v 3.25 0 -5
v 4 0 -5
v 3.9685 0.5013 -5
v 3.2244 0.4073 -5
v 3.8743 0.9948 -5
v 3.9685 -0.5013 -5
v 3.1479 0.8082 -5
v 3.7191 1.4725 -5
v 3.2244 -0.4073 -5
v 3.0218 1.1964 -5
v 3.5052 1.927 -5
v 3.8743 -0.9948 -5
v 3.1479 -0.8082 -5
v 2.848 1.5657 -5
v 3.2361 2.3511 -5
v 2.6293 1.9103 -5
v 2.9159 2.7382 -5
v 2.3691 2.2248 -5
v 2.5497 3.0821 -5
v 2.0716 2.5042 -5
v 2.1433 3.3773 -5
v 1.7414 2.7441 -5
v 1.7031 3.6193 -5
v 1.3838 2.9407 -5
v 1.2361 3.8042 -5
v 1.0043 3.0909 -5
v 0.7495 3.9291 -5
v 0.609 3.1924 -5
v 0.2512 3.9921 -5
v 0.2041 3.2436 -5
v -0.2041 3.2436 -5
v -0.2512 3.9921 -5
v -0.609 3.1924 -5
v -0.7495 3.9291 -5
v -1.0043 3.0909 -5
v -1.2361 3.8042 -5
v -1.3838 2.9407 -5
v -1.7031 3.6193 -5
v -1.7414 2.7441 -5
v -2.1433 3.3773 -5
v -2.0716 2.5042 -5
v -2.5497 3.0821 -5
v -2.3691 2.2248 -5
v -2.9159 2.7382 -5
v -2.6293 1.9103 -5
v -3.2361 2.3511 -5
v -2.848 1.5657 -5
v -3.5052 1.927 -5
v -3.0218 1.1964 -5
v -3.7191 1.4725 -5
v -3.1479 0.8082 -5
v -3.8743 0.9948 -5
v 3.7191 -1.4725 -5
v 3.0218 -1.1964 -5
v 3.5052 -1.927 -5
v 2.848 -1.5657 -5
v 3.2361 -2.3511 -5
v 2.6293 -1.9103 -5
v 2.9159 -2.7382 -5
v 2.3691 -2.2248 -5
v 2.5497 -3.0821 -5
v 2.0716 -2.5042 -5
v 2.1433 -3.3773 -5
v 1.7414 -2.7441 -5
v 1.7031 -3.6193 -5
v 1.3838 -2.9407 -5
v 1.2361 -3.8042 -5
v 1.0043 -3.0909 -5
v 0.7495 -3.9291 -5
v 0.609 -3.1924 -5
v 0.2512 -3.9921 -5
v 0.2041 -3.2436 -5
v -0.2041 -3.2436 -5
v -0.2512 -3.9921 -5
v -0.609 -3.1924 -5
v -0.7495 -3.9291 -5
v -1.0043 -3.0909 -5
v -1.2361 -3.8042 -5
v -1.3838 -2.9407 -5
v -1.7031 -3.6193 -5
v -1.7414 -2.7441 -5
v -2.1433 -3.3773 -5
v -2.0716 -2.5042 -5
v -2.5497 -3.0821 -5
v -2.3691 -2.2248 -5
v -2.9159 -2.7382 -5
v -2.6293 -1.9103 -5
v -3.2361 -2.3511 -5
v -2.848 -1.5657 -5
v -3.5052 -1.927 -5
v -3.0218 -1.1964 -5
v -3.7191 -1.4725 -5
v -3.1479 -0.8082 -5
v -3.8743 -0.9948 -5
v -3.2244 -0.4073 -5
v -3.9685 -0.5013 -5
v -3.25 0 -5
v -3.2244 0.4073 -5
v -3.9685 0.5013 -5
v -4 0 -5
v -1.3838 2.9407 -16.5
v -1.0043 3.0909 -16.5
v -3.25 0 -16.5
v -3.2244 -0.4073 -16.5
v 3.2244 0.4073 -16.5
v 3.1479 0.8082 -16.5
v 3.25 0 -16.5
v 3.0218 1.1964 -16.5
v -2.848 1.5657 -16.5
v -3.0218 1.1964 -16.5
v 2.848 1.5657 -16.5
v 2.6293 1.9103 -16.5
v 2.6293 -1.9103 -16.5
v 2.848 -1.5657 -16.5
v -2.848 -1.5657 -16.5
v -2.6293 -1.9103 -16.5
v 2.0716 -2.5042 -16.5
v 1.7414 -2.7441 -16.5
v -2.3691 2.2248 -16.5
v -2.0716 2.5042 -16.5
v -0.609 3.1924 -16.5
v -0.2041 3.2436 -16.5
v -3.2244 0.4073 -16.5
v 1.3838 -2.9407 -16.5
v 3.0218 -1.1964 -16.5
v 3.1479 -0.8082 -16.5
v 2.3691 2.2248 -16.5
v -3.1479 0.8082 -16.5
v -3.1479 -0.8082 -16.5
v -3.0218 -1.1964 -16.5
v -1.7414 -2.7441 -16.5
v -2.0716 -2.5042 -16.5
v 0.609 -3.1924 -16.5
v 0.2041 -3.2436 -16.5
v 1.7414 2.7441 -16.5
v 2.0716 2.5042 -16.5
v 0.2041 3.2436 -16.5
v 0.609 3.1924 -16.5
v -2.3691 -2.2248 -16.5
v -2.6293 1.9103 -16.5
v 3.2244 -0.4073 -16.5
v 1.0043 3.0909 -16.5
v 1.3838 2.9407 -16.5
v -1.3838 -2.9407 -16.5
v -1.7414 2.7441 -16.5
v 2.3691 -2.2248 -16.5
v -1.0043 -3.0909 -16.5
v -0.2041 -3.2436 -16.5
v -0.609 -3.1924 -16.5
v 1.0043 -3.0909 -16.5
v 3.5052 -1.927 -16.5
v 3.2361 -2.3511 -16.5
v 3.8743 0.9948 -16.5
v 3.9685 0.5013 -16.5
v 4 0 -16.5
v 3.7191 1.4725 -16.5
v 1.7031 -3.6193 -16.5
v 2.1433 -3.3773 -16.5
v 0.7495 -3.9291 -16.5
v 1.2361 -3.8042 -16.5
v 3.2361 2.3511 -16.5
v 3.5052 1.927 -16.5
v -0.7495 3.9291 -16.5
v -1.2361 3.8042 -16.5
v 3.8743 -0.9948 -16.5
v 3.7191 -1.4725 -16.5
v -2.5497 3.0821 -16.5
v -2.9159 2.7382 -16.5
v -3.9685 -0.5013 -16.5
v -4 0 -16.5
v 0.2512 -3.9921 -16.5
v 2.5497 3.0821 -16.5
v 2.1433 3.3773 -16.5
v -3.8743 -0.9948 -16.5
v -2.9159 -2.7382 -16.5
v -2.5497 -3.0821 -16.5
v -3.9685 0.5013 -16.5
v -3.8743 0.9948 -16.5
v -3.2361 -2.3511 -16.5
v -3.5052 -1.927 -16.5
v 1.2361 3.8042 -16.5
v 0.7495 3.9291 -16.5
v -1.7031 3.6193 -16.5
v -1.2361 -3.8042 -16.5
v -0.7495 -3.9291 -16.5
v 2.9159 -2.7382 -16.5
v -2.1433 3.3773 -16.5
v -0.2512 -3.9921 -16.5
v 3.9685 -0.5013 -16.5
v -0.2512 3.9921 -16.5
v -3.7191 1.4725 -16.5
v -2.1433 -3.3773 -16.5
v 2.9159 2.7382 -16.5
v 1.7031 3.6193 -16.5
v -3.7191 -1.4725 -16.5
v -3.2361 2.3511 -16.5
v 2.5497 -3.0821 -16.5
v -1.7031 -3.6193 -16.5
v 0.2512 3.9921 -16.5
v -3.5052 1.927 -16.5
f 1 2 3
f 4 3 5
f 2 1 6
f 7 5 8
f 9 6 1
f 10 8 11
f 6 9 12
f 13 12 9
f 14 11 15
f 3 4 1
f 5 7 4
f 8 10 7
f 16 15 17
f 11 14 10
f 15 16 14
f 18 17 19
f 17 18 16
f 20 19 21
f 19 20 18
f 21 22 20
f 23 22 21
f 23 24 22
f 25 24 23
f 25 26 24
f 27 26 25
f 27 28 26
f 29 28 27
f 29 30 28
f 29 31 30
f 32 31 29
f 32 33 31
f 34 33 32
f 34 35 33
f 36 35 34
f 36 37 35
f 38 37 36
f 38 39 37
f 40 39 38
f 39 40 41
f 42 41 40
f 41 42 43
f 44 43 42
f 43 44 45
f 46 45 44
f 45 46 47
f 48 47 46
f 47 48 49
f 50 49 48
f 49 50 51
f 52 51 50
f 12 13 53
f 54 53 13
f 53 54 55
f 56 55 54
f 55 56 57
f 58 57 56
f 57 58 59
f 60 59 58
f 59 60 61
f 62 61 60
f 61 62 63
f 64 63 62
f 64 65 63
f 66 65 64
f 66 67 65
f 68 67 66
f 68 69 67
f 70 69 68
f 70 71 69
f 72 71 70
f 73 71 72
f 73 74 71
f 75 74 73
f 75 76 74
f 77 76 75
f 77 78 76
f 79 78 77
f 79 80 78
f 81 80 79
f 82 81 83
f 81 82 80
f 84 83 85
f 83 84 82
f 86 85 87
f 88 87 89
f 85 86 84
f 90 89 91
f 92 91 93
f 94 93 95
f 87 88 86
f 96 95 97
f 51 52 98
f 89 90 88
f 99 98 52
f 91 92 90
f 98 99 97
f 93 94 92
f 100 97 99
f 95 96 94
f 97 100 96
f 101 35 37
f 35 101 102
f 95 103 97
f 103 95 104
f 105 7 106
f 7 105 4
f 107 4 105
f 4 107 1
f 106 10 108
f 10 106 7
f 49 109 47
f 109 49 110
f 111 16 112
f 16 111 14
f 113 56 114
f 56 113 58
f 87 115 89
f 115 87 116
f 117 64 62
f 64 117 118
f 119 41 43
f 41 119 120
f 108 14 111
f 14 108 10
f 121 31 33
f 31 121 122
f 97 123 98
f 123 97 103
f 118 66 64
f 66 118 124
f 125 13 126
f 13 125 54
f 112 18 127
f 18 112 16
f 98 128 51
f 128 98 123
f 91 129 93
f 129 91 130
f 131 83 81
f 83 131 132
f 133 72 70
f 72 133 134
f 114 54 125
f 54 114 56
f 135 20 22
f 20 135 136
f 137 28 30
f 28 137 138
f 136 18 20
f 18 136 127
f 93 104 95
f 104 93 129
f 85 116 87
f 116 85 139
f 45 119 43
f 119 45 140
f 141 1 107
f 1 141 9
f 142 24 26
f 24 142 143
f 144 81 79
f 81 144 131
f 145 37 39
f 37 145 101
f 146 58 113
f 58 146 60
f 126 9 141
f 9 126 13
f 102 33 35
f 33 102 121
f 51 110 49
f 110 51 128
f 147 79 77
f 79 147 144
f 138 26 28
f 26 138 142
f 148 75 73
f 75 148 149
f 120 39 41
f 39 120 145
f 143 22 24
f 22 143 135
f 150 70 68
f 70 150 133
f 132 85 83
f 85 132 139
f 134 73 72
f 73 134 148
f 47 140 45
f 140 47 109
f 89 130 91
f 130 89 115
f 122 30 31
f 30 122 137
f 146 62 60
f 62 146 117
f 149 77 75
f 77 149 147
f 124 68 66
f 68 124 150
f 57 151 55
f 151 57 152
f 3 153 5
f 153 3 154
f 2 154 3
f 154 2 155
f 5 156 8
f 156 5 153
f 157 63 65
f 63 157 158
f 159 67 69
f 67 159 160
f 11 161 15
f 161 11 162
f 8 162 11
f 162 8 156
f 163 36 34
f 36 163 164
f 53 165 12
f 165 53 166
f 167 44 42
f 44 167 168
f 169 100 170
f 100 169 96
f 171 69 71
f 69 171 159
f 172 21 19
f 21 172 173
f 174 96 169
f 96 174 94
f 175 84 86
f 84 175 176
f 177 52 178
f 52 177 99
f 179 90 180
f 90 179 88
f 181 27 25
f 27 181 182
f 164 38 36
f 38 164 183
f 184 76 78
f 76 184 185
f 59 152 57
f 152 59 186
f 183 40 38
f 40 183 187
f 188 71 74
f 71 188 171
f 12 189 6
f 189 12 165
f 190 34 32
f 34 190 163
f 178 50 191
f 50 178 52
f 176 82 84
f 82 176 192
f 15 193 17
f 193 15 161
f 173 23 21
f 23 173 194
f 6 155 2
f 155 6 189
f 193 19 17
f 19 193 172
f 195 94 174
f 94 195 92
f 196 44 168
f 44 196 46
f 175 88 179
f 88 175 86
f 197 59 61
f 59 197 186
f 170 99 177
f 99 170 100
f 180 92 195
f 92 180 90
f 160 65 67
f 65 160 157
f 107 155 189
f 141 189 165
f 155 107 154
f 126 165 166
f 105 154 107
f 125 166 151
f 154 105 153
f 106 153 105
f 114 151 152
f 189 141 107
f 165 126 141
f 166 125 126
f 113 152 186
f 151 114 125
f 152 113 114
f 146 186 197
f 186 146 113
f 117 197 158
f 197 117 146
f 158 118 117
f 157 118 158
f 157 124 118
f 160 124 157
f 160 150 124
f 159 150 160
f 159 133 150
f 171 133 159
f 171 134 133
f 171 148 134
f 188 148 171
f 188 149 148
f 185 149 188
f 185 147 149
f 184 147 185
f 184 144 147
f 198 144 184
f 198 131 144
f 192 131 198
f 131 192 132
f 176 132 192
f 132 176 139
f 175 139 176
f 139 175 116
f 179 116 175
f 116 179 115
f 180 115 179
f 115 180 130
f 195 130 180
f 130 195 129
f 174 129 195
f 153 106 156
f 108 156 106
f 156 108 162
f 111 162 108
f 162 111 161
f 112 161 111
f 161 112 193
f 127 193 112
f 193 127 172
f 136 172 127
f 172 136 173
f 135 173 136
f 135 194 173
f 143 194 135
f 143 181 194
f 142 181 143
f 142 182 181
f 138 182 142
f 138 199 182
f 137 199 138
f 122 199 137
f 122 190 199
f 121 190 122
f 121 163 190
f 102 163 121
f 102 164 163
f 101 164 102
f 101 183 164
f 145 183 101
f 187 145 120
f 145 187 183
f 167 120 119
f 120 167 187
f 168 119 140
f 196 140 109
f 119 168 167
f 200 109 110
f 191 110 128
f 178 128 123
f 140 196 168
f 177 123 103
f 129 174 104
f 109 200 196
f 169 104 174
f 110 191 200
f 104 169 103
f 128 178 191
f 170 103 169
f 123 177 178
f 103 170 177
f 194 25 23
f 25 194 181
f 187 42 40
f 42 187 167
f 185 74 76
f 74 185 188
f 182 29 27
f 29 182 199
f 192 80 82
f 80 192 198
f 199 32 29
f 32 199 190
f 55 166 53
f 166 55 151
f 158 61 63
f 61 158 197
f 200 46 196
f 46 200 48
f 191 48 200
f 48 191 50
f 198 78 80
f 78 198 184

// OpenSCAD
$fn = 50;

difference() {
	union() {
		translate(v = [0, 0, -16.5]) {
			cylinder(h = 19.5, r = 4.0);
		}
	}
	union() {
		translate(v = [0, 0, 0]) {
			rotate(a = [0, 0, 0]) {
				difference() {
					union() {
						translate(v = [0, 0, -5]) {
							linear_extrude(height = 5) {
								polygon(points = [[5.914249999999999, 0.0], [2.957125, 5.1218907443321156], [-2.9571249999999982, 5.1218907443321156], [-5.914249999999999, 7.242867331857232e-16], [-2.9571250000000022, -5.121890744332115], [2.9571249999999956, -5.121890744332118]]);
							}
						}
					}
					union();
				}
			}
		}
		#cylinder(h = 3, r = 6.25);
		#translate(v = [0, 0, -100.0]) {
			cylinder(h = 200, r = 3.25);
		}
	}
}
